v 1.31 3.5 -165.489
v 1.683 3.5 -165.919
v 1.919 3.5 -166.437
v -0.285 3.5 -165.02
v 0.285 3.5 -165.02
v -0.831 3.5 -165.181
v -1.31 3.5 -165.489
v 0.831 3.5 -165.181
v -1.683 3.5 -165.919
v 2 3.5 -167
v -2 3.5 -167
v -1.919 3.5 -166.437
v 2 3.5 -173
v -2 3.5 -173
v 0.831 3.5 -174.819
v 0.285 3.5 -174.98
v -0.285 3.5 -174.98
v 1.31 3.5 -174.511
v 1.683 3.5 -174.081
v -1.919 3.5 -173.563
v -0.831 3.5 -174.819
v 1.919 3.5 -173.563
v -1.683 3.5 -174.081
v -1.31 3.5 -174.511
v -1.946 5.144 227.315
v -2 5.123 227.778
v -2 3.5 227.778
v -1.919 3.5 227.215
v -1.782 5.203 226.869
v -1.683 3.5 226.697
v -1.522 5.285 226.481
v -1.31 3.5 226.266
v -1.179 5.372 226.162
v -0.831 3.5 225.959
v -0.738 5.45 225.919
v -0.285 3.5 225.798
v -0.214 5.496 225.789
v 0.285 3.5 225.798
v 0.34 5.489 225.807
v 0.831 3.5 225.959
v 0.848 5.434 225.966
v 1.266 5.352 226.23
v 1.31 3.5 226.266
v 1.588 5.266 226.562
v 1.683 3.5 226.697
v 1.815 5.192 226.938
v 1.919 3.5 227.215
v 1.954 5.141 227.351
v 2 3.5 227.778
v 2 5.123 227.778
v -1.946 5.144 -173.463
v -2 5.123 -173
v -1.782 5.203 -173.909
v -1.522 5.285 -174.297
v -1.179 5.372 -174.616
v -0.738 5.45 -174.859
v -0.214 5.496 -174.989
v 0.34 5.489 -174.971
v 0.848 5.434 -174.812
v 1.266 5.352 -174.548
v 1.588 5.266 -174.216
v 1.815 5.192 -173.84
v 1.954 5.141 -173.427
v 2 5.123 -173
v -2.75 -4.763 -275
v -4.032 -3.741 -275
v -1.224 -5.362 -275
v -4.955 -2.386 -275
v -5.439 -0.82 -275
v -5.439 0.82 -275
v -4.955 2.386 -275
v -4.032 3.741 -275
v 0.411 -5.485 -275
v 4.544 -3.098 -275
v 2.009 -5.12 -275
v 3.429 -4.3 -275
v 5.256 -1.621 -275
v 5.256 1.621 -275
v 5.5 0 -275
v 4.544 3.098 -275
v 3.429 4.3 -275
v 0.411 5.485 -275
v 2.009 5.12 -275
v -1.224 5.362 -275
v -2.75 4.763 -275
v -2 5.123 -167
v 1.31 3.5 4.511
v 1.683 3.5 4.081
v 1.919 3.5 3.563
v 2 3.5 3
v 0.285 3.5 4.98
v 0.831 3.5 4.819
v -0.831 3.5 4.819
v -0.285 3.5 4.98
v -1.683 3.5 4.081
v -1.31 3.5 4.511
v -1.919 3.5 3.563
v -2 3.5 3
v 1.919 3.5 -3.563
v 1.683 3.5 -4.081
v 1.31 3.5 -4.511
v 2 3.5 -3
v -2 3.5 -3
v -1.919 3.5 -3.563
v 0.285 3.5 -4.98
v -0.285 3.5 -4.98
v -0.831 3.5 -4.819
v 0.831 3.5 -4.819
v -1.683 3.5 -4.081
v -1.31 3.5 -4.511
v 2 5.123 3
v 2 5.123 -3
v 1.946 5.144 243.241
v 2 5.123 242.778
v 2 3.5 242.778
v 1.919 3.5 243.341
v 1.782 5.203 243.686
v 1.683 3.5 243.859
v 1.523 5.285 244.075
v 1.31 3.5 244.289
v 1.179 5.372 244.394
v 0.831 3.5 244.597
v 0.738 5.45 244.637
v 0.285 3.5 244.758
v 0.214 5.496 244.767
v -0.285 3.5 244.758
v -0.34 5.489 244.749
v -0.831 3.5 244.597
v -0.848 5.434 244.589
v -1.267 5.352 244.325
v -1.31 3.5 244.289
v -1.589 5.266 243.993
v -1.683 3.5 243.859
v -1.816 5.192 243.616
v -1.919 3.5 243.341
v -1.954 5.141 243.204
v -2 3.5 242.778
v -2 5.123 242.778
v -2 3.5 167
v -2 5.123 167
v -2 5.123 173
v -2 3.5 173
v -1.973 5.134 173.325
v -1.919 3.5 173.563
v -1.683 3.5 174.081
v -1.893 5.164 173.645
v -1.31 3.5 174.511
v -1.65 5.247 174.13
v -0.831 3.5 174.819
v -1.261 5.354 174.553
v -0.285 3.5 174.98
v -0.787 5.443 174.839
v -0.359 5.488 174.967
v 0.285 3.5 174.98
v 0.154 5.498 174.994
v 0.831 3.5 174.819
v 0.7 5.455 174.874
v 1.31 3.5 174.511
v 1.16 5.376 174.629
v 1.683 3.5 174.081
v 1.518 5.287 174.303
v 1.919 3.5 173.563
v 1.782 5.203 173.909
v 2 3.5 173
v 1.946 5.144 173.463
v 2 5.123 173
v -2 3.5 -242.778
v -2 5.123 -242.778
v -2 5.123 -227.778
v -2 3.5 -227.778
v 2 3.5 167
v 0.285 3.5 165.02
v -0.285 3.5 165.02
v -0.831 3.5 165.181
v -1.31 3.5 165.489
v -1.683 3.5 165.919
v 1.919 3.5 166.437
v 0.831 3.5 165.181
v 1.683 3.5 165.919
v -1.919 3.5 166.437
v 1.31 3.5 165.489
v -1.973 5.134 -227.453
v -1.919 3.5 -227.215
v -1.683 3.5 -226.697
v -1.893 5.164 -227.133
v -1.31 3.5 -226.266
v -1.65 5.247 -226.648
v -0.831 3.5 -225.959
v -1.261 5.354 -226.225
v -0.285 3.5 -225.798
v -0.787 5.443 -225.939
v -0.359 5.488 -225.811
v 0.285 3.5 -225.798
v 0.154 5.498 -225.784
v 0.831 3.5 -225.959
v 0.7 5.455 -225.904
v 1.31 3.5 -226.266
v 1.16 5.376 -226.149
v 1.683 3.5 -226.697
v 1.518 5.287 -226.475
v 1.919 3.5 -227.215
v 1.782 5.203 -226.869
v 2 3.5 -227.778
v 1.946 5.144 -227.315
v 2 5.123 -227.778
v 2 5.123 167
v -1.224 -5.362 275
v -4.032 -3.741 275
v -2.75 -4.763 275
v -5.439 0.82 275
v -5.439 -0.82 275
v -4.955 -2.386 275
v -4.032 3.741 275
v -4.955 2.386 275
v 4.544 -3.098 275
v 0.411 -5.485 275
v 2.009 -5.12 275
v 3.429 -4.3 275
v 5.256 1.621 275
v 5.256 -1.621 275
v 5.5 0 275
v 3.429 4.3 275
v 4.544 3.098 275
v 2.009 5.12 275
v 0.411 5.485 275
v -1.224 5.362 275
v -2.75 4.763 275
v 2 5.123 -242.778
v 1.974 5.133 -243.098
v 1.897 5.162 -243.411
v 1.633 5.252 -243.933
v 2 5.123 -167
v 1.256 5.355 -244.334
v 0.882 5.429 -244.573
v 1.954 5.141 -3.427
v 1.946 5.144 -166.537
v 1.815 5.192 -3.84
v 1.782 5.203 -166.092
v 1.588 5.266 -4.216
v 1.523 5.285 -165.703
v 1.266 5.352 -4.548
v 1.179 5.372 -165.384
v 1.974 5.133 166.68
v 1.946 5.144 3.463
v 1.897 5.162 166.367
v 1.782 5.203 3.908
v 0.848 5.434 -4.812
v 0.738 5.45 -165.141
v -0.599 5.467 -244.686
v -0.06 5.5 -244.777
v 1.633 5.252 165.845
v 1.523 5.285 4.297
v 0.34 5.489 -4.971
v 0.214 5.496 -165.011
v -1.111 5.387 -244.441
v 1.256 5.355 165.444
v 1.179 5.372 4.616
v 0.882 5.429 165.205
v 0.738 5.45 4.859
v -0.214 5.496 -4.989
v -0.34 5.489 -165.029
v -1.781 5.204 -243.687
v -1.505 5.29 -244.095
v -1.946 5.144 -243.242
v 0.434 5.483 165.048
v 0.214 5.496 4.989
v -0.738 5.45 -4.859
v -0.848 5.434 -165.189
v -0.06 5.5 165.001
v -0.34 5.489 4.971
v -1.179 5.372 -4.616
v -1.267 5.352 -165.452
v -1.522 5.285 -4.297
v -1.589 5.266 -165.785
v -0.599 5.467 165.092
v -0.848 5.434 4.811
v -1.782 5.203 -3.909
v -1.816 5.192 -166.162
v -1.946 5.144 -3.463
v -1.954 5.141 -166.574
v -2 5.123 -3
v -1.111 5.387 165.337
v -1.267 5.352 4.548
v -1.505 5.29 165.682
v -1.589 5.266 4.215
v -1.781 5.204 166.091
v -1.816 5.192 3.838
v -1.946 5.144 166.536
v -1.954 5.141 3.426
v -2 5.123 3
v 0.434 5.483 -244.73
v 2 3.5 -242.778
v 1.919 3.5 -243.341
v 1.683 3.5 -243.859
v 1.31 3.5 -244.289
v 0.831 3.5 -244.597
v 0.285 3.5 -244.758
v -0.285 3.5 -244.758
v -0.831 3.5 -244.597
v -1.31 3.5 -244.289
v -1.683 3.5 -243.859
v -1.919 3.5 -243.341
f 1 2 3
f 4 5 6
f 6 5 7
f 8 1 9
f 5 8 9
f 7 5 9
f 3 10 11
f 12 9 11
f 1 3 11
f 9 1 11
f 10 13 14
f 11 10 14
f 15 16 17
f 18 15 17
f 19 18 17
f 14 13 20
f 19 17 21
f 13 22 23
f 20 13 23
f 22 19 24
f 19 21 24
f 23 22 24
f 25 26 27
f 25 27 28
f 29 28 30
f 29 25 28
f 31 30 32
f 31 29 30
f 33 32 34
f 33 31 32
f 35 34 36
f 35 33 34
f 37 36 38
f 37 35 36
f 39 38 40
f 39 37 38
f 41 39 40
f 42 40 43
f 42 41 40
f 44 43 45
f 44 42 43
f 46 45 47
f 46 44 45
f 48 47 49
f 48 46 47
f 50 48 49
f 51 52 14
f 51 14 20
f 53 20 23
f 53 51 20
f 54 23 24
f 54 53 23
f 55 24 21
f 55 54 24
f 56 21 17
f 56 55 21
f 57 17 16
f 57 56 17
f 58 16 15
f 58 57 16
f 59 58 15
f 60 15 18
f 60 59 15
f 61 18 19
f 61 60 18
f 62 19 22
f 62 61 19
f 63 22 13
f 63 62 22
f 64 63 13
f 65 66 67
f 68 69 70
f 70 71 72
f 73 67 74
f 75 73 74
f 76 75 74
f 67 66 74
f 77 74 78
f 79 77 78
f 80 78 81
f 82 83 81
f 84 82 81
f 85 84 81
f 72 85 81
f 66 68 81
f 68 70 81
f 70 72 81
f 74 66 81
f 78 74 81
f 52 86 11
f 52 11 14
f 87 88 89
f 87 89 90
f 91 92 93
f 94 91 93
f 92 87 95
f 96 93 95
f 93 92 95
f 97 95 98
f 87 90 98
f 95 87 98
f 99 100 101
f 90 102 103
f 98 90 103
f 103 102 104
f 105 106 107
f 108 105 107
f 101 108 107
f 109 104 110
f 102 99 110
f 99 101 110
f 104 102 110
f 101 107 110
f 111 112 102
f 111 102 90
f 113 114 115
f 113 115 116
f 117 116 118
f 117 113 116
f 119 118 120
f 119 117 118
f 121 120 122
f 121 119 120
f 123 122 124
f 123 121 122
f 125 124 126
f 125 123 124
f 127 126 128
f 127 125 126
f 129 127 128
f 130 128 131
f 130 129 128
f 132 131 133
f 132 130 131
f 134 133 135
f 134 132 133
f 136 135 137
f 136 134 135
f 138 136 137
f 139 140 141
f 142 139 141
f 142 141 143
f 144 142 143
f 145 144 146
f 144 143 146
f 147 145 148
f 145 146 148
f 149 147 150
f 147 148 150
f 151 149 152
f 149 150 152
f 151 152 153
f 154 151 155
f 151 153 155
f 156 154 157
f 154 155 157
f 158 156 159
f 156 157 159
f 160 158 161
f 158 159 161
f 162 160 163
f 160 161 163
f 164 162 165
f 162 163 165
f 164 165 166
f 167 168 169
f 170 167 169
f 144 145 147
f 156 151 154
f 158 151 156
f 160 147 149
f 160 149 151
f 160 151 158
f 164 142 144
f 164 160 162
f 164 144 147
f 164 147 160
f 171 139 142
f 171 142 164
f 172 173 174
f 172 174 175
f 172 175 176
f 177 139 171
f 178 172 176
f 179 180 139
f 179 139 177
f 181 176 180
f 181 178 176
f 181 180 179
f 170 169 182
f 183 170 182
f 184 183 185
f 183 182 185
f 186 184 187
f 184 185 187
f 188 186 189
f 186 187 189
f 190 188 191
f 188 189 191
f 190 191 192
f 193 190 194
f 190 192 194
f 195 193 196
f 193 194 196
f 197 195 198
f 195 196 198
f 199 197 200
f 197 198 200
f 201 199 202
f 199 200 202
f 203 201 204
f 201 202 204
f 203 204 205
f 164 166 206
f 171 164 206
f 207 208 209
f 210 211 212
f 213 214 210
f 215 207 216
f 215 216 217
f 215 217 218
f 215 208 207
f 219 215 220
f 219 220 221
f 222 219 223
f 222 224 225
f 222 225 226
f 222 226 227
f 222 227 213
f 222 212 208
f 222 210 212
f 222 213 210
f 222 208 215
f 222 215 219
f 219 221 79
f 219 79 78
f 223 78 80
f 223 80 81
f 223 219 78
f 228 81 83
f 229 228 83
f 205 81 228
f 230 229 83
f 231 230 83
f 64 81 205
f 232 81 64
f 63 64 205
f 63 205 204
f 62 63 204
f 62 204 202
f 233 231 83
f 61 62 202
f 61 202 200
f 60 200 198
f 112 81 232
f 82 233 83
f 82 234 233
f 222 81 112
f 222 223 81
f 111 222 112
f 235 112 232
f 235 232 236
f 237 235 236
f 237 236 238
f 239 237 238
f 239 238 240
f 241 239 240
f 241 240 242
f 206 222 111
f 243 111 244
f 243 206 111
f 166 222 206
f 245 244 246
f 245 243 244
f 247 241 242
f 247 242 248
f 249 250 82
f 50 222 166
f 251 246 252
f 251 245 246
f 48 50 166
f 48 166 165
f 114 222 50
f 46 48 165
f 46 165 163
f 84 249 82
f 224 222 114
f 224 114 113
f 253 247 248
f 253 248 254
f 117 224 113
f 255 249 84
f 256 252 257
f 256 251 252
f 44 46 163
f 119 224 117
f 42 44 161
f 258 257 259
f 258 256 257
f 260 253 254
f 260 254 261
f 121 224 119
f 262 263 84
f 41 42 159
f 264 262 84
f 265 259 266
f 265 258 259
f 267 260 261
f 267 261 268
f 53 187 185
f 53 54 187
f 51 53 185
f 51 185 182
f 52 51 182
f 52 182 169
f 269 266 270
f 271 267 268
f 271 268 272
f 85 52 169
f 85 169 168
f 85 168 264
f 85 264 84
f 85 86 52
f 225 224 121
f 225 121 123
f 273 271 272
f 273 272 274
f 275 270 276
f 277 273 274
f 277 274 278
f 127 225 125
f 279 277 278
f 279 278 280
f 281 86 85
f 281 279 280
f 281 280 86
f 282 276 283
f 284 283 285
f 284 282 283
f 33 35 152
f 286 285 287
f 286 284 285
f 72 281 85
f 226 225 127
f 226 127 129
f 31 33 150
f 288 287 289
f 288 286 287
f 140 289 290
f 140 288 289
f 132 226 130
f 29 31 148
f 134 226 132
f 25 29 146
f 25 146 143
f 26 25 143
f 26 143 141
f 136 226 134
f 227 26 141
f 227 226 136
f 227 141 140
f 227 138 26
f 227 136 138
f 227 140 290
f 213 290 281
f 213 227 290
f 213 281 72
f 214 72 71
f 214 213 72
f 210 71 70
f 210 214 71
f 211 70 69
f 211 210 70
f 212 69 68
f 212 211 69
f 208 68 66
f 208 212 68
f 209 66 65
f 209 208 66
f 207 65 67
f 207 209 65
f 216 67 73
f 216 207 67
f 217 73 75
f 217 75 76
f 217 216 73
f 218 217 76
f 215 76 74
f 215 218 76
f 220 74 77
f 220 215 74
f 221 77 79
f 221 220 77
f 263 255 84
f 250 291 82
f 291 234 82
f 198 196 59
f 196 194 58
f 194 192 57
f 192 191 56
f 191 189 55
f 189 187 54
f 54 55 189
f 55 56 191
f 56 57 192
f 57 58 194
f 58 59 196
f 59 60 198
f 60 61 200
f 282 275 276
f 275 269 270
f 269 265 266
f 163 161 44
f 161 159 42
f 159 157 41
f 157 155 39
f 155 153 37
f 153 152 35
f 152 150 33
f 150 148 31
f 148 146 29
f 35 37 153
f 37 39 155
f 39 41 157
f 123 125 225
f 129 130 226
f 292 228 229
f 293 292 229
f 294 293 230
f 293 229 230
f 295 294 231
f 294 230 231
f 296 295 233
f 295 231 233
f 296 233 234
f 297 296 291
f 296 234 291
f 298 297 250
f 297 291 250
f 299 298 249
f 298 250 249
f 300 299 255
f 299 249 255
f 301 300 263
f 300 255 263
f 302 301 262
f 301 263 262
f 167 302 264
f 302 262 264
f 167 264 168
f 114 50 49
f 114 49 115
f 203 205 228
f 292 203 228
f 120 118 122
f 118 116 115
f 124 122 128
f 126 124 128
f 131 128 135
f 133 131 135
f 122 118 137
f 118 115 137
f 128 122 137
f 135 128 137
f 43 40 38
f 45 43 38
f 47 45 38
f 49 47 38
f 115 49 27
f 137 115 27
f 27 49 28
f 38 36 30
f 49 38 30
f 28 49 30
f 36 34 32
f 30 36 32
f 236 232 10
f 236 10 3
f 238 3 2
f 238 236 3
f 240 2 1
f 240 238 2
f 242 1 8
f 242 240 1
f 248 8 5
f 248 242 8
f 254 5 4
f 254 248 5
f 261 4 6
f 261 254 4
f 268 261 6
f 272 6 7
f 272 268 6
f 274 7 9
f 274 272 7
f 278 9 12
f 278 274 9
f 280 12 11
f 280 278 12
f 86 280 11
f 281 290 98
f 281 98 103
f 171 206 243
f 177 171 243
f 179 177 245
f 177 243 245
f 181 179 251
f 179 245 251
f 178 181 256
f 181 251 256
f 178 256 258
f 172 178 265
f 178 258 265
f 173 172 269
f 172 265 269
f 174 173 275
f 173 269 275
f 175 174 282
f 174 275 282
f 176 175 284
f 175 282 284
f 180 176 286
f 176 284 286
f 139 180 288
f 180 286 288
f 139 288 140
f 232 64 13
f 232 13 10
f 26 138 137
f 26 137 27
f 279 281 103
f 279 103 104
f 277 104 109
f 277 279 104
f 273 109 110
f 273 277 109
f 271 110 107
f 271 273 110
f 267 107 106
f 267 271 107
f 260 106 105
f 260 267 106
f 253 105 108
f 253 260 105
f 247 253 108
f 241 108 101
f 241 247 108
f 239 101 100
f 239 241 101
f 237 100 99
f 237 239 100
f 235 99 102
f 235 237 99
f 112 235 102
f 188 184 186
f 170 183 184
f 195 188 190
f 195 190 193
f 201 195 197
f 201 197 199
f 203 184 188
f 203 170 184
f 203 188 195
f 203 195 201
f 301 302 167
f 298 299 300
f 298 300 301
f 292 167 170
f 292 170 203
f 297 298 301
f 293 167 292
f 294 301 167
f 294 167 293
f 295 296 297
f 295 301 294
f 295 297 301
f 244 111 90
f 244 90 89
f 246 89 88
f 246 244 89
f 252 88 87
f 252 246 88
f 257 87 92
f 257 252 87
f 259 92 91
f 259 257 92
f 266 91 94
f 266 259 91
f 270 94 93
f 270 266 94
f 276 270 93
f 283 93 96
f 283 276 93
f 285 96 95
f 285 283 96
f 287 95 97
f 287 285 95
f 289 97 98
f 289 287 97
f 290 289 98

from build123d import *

# Parameters (mm, degrees)
SKETCH_1_R          = 5.5
EXTRUDE_1_DEPTH     = 275
CUT_EXTRUDE_1_DEPTH = 2
CUT_EXTRUDE_2_DEPTH = 2
CUT_EXTRUDE_3_DEPTH = 2


with BuildPart() as part:
    # 草图1 → 凸台-拉伸1 (new, symmetric)
    with BuildSketch(Plane.XY):
        Circle(SKETCH_1_R)
    extrude(amount=EXTRUDE_1_DEPTH, both=True)

    # 草图2 → 切除-拉伸1 (cut)
    with BuildSketch(Plane(origin=(0, 5.5, 0), x_dir=(1, 0, 0), z_dir=(0, 1, 0))):
        with BuildLine():
            Line((2, 3), (2, -3))
            ThreePointArc((2, -3), (0, -5), (-2, -3))
            Line((-2, -3), (-2, 3))
            ThreePointArc((-2, 3), (0, 5), (2, 3))
        make_face()
    extrude(amount=-CUT_EXTRUDE_1_DEPTH, mode=Mode.SUBTRACT)

    # 草图3 → 切除-拉伸2 (cut)
    with BuildSketch(Plane(origin=(0, 5.5, 0), x_dir=(1, 0, 0), z_dir=(0, 1, 0))):
        with BuildLine():
            Line((2, 173), (2, 167))
            ThreePointArc((2, 167), (0, 165), (-2, 167))
            Line((-2, 167), (-2, 173))
            ThreePointArc((-2, 173), (0, 175), (2, 173))
        make_face()
        with BuildLine():
            Line((2, -173), (2, -167))
            ThreePointArc((2, -167), (0, -165), (-2, -167))
            Line((-2, -167), (-2, -173))
            ThreePointArc((-2, -173), (0, -175), (2, -173))
        make_face()
    extrude(amount=-CUT_EXTRUDE_2_DEPTH, mode=Mode.SUBTRACT)

    # 草图4 → 切除-拉伸3 (cut)
    with BuildSketch(Plane(origin=(0, 5.5, 0), x_dir=(1, 0, 0), z_dir=(0, 1, 0))):
        with BuildLine():
            Line((-2, -242.77797753), (-2, -227.77797753))
            ThreePointArc((-2, -227.77797753), (0, -225.77797753), (2, -227.77797753))
            Line((2, -227.77797753), (2, -242.77797753))
            ThreePointArc((2, -242.77797753), (0, -244.77797753), (-2, -242.77797753))
        make_face()
        with BuildLine():
            Line((-2, 242.77797753), (-2, 227.77797753))
            ThreePointArc((-2, 227.77797753), (0, 225.77797753), (2, 227.77797753))
            Line((2, 227.77797753), (2, 242.77797753))
            ThreePointArc((2, 242.77797753), (0, 244.77797753), (-2, 242.77797753))
        make_face()
    extrude(amount=-CUT_EXTRUDE_3_DEPTH, mode=Mode.SUBTRACT)


solid = part.part
